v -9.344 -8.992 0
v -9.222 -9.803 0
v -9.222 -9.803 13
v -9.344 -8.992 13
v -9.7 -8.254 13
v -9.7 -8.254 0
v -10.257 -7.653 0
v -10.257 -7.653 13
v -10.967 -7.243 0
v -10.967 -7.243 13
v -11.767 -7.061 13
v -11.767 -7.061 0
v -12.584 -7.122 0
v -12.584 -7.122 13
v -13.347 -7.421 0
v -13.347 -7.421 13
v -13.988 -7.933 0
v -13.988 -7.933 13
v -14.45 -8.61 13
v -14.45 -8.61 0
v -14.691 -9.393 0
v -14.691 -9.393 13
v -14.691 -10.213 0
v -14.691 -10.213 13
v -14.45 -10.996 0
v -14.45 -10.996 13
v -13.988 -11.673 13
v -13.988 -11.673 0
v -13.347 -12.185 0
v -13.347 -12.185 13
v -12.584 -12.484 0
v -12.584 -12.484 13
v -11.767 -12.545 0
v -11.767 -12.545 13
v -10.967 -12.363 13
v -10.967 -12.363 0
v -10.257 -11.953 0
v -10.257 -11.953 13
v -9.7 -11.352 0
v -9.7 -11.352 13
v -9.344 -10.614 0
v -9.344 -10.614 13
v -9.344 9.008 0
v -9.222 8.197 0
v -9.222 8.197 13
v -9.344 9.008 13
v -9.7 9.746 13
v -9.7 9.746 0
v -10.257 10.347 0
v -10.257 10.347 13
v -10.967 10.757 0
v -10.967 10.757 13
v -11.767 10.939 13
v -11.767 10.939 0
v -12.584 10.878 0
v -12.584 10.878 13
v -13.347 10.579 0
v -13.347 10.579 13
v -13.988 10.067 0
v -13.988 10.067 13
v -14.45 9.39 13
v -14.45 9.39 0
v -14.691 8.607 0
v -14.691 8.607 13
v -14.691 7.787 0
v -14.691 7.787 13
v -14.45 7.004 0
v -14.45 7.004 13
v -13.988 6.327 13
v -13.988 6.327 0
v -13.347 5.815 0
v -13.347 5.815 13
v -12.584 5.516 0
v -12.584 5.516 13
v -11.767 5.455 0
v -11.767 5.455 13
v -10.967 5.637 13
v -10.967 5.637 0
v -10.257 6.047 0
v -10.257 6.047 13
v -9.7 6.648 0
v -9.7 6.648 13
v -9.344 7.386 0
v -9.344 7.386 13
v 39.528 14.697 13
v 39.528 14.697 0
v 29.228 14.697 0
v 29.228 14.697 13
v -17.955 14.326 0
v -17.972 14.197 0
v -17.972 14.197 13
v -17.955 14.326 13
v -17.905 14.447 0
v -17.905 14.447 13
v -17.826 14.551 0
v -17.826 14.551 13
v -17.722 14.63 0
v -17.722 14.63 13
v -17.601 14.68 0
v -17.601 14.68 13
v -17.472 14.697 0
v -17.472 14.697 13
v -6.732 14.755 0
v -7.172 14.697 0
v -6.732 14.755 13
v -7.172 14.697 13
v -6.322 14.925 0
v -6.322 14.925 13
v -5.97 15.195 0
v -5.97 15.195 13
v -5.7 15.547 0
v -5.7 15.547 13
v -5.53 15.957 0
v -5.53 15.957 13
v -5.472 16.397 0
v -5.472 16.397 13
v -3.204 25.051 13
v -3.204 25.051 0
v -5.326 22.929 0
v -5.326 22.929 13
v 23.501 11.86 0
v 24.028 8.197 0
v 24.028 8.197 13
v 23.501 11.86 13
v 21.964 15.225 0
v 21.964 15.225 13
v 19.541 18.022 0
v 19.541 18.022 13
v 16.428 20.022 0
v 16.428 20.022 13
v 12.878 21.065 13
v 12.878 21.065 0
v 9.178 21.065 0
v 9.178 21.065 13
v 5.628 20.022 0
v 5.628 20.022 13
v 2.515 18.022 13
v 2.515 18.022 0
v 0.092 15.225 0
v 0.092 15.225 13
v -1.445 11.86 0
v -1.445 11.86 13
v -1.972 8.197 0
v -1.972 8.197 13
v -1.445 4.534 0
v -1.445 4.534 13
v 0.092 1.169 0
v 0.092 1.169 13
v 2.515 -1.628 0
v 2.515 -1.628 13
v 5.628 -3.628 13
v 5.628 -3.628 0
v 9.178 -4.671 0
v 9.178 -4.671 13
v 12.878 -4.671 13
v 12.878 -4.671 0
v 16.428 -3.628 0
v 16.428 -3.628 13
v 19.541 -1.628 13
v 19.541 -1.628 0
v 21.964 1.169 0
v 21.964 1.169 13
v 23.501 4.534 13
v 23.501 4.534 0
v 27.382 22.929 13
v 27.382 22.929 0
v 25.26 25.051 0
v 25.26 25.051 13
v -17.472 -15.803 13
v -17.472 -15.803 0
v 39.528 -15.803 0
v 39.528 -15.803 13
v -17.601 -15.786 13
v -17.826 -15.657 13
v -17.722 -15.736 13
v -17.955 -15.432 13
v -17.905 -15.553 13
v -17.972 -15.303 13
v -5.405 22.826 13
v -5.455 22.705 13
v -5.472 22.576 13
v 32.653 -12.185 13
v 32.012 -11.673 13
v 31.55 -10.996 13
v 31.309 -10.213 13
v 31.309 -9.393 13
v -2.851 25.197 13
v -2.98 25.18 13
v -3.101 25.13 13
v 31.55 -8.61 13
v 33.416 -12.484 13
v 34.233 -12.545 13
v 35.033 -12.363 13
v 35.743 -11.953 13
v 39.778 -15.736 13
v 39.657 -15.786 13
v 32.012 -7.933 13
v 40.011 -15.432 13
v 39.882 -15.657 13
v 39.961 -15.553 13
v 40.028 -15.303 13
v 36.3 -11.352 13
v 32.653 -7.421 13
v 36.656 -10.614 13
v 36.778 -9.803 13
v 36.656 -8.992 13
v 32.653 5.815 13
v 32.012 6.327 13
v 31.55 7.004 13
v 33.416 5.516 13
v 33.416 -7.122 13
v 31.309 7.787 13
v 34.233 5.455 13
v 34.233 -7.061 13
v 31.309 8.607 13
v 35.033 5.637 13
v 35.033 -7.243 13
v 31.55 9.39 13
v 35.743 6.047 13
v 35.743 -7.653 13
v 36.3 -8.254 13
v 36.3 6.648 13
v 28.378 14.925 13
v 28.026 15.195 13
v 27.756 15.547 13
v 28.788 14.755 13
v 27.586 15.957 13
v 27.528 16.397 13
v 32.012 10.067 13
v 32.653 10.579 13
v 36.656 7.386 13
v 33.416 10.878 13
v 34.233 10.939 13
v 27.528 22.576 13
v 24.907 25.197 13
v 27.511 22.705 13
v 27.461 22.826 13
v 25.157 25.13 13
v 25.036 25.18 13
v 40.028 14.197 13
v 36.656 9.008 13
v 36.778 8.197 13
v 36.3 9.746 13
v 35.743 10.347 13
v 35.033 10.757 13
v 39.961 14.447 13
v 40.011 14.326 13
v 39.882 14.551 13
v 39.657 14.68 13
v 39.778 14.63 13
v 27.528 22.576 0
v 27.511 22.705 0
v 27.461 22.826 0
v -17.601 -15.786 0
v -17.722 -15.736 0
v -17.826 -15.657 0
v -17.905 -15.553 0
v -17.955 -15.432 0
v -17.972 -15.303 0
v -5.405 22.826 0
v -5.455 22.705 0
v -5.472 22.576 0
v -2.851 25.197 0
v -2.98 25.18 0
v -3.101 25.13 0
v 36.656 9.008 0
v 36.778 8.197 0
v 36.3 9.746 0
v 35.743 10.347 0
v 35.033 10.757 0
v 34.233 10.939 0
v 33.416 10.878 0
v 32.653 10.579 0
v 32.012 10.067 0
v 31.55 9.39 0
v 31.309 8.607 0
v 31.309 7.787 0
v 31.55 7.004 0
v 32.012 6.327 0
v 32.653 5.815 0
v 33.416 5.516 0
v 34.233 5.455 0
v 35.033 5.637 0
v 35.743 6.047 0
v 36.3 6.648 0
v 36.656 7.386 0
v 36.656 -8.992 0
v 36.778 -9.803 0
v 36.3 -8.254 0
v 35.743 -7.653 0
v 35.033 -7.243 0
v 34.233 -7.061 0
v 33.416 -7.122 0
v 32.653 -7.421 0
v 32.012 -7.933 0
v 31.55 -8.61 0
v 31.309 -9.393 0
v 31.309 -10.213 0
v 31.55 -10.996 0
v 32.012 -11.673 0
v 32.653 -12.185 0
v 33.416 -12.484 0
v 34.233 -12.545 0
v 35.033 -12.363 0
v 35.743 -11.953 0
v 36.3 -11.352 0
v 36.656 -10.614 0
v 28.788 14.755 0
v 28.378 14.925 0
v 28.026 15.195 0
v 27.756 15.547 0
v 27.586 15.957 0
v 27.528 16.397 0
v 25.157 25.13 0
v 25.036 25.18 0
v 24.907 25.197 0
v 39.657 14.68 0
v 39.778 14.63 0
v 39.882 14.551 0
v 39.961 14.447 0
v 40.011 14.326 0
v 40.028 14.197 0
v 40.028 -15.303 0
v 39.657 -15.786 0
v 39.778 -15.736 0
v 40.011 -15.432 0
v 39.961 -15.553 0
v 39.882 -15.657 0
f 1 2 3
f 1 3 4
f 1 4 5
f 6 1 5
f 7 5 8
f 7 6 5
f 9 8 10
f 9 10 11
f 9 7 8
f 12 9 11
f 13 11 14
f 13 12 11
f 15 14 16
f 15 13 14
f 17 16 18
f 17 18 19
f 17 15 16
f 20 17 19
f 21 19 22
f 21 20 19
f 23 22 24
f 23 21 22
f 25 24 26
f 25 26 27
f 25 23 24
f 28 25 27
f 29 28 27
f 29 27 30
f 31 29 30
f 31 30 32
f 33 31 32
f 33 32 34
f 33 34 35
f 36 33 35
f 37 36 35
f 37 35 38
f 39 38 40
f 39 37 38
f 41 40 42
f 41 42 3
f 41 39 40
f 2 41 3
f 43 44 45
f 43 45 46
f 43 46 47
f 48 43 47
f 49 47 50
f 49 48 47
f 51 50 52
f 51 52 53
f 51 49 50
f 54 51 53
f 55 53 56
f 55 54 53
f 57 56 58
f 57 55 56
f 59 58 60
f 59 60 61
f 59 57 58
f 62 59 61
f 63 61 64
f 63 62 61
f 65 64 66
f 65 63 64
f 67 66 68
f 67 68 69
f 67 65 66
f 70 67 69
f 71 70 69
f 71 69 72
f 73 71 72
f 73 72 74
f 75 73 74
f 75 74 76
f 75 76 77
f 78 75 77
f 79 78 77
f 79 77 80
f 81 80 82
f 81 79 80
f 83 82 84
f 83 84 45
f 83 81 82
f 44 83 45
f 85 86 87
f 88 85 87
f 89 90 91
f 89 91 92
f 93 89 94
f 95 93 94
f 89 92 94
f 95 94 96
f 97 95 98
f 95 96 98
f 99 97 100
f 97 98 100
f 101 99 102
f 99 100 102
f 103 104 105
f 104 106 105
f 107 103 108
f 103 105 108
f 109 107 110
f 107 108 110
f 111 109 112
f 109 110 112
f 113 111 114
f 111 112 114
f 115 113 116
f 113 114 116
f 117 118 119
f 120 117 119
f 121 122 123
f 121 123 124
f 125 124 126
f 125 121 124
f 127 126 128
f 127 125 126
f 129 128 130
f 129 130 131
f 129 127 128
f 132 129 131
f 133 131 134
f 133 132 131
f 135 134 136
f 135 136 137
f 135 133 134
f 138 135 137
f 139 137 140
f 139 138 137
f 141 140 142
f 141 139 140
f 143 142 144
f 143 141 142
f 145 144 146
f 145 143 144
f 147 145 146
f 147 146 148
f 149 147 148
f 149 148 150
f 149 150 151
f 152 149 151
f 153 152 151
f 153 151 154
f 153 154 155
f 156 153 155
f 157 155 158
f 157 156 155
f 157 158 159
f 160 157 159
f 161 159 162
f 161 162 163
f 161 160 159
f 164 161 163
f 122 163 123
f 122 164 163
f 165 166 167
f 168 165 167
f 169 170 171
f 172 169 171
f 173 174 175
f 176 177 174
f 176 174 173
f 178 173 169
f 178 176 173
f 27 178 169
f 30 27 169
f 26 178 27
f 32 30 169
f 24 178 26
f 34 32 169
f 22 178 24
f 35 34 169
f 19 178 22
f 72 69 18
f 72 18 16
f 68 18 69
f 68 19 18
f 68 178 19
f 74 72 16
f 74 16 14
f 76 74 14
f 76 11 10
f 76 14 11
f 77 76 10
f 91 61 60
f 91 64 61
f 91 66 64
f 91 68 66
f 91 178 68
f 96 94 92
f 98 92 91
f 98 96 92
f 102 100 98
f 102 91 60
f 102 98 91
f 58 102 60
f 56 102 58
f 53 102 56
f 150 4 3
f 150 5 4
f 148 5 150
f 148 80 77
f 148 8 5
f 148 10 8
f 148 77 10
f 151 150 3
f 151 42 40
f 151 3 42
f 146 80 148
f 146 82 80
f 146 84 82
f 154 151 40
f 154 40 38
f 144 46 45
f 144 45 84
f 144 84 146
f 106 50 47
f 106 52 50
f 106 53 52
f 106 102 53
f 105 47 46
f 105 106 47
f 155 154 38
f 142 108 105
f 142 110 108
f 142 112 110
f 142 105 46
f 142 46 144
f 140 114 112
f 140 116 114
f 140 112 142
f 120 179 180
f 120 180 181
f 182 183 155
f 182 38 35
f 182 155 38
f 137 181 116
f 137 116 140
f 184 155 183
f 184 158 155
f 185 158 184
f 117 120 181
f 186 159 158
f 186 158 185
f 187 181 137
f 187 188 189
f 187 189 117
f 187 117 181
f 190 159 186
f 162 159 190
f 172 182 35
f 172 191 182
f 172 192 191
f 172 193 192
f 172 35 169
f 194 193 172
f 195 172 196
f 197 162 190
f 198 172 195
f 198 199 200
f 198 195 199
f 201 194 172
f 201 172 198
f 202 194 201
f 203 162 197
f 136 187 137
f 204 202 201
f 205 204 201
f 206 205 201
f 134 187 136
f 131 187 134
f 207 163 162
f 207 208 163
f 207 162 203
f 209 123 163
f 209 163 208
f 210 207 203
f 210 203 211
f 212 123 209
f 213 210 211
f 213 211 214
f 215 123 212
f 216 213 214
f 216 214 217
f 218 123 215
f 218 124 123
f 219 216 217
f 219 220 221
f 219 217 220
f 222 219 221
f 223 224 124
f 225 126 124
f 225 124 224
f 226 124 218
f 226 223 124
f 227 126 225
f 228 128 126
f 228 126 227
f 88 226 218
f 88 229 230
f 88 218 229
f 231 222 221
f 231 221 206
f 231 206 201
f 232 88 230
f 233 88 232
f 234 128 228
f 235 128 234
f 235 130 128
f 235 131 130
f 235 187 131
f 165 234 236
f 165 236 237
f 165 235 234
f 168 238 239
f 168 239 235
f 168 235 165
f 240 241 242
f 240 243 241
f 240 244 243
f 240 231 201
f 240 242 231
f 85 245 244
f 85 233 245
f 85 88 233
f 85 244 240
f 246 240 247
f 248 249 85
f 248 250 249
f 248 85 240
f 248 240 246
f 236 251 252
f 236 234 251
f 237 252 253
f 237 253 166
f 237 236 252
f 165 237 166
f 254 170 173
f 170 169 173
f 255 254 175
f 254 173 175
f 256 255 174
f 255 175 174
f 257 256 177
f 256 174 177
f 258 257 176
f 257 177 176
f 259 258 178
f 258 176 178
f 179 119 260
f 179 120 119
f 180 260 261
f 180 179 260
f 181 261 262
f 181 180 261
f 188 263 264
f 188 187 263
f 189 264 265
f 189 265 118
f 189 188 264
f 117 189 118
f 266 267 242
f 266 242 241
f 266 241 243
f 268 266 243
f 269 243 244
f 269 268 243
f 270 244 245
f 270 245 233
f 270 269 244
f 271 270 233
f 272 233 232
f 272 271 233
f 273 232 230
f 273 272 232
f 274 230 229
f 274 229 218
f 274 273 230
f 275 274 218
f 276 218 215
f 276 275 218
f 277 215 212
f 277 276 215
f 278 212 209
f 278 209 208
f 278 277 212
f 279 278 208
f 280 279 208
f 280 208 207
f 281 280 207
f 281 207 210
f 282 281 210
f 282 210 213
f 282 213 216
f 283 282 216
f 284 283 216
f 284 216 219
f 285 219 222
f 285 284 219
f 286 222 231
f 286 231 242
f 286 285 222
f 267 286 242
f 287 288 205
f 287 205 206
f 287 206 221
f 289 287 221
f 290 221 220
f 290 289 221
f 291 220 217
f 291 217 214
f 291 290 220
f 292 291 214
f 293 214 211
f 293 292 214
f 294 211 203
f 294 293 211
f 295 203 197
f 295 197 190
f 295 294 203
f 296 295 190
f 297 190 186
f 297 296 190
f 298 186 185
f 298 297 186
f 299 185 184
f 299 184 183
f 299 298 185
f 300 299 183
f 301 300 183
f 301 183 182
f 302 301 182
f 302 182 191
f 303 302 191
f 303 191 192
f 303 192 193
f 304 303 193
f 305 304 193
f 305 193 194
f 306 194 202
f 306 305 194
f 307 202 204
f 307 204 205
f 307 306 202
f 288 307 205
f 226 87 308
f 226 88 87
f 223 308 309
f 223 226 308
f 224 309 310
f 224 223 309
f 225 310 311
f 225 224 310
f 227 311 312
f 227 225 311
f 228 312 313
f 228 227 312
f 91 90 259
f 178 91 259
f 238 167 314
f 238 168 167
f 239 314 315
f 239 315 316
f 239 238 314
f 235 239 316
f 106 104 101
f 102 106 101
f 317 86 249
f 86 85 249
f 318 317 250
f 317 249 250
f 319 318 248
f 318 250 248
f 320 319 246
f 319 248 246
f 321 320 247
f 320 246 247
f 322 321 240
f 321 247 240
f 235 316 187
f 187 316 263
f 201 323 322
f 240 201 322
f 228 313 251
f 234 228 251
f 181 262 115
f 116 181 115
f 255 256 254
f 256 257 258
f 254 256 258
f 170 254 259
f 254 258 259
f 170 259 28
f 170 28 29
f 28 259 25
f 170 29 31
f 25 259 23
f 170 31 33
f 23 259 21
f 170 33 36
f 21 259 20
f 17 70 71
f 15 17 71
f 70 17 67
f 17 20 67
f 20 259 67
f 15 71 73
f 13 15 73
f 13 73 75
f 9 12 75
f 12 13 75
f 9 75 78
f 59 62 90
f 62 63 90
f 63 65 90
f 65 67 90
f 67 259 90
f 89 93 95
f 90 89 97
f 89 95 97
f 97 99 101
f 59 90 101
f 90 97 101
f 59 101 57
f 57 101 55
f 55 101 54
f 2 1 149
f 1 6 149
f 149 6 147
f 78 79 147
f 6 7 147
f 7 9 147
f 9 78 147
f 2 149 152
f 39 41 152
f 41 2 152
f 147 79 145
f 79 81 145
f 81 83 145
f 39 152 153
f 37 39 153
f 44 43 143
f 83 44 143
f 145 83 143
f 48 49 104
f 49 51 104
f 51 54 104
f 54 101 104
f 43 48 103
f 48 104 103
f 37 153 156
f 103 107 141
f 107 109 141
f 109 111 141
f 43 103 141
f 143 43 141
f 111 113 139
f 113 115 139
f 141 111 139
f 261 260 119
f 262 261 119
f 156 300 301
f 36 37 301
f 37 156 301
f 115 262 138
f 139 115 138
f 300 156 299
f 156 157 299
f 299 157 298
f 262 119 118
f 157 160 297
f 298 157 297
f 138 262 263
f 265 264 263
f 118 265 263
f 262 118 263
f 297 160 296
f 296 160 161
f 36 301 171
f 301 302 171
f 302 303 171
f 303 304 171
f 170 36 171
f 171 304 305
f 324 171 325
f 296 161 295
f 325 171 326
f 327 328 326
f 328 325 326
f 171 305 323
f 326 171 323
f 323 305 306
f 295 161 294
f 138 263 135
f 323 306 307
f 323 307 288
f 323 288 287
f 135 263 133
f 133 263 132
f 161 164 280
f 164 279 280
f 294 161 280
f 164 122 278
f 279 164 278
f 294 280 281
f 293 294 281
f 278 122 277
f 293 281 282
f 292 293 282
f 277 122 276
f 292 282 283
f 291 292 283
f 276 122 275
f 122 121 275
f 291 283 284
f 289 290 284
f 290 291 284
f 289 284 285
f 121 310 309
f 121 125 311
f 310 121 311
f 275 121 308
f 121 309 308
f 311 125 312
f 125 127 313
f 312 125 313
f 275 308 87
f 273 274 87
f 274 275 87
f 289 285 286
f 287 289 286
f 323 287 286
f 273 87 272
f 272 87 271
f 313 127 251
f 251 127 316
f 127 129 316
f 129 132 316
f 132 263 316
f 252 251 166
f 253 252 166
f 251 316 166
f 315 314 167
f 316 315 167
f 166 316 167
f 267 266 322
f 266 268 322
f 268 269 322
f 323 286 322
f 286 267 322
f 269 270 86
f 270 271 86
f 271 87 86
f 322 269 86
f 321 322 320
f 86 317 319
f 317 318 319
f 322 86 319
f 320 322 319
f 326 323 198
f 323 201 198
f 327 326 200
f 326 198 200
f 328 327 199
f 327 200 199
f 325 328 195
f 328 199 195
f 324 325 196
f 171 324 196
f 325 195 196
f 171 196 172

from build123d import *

# Parameters (mm, degrees)
SKETCH1_R           = 2.75
SKETCH1_R_2         = 13
BOSS_EXTRUDE1_DEPTH = 13
FILLET1_R           = 1.7
FILLET2_R           = 0.5


with BuildPart() as part:
    # Sketch1 → Boss-Extrude1 (new body)
    with BuildSketch(Plane.XY):
        Polygon((40.027969698, 14.696983914), (27.527969698, 14.696983914), (27.527969698, 22.782770351), (25.113756136, 25.196983914), (-3.057816739, 25.196983914), (-5.472030302, 22.782770351), (-5.472030302, 14.696983914), (-17.972030302, 14.696983914), (-17.972030302, -15.803016086), (40.027969698, -15.803016086), align=None)
        with Locations((34.027969698, 8.196983914)):
            Circle(SKETCH1_R, mode=Mode.SUBTRACT)
        with Locations((34.027969698, -9.803016086)):
            Circle(SKETCH1_R, mode=Mode.SUBTRACT)
        with Locations((-11.972030302, -9.803016086)):
            Circle(SKETCH1_R, mode=Mode.SUBTRACT)
        with Locations((-11.972030302, 8.196983914)):
            Circle(SKETCH1_R, mode=Mode.SUBTRACT)
        with Locations((11.027969698, 8.196983914)):
            Circle(SKETCH1_R_2, mode=Mode.SUBTRACT)
    extrude(amount=BOSS_EXTRUDE1_DEPTH)

    # Fillet1
    fillet1_edges = [part.edges().sort_by_distance(p)[0] for p in [
        (-5.472030302, 14.696983914, 6.5),
        (27.527969698, 14.696983914, 6.5),
    ]]
    fillet(fillet1_edges, radius=FILLET1_R)

    # Fillet2
    fillet2_edges = [part.edges().sort_by_distance(p)[0] for p in [
        (40.027969698, -15.803016086, 6.5),
        (-17.972030302, -15.803016086, 6.5),
        (-17.972030302, 14.696983914, 6.5),
        (-5.472030302, 22.782770351, 6.5),
        (-3.057816739, 25.196983914, 6.5),
        (25.113756136, 25.196983914, 6.5),
        (27.527969698, 22.782770351, 6.5),
        (40.027969698, 14.696983914, 6.5),
    ]]
    fillet(fillet2_edges, radius=FILLET2_R)


solid = part.part
